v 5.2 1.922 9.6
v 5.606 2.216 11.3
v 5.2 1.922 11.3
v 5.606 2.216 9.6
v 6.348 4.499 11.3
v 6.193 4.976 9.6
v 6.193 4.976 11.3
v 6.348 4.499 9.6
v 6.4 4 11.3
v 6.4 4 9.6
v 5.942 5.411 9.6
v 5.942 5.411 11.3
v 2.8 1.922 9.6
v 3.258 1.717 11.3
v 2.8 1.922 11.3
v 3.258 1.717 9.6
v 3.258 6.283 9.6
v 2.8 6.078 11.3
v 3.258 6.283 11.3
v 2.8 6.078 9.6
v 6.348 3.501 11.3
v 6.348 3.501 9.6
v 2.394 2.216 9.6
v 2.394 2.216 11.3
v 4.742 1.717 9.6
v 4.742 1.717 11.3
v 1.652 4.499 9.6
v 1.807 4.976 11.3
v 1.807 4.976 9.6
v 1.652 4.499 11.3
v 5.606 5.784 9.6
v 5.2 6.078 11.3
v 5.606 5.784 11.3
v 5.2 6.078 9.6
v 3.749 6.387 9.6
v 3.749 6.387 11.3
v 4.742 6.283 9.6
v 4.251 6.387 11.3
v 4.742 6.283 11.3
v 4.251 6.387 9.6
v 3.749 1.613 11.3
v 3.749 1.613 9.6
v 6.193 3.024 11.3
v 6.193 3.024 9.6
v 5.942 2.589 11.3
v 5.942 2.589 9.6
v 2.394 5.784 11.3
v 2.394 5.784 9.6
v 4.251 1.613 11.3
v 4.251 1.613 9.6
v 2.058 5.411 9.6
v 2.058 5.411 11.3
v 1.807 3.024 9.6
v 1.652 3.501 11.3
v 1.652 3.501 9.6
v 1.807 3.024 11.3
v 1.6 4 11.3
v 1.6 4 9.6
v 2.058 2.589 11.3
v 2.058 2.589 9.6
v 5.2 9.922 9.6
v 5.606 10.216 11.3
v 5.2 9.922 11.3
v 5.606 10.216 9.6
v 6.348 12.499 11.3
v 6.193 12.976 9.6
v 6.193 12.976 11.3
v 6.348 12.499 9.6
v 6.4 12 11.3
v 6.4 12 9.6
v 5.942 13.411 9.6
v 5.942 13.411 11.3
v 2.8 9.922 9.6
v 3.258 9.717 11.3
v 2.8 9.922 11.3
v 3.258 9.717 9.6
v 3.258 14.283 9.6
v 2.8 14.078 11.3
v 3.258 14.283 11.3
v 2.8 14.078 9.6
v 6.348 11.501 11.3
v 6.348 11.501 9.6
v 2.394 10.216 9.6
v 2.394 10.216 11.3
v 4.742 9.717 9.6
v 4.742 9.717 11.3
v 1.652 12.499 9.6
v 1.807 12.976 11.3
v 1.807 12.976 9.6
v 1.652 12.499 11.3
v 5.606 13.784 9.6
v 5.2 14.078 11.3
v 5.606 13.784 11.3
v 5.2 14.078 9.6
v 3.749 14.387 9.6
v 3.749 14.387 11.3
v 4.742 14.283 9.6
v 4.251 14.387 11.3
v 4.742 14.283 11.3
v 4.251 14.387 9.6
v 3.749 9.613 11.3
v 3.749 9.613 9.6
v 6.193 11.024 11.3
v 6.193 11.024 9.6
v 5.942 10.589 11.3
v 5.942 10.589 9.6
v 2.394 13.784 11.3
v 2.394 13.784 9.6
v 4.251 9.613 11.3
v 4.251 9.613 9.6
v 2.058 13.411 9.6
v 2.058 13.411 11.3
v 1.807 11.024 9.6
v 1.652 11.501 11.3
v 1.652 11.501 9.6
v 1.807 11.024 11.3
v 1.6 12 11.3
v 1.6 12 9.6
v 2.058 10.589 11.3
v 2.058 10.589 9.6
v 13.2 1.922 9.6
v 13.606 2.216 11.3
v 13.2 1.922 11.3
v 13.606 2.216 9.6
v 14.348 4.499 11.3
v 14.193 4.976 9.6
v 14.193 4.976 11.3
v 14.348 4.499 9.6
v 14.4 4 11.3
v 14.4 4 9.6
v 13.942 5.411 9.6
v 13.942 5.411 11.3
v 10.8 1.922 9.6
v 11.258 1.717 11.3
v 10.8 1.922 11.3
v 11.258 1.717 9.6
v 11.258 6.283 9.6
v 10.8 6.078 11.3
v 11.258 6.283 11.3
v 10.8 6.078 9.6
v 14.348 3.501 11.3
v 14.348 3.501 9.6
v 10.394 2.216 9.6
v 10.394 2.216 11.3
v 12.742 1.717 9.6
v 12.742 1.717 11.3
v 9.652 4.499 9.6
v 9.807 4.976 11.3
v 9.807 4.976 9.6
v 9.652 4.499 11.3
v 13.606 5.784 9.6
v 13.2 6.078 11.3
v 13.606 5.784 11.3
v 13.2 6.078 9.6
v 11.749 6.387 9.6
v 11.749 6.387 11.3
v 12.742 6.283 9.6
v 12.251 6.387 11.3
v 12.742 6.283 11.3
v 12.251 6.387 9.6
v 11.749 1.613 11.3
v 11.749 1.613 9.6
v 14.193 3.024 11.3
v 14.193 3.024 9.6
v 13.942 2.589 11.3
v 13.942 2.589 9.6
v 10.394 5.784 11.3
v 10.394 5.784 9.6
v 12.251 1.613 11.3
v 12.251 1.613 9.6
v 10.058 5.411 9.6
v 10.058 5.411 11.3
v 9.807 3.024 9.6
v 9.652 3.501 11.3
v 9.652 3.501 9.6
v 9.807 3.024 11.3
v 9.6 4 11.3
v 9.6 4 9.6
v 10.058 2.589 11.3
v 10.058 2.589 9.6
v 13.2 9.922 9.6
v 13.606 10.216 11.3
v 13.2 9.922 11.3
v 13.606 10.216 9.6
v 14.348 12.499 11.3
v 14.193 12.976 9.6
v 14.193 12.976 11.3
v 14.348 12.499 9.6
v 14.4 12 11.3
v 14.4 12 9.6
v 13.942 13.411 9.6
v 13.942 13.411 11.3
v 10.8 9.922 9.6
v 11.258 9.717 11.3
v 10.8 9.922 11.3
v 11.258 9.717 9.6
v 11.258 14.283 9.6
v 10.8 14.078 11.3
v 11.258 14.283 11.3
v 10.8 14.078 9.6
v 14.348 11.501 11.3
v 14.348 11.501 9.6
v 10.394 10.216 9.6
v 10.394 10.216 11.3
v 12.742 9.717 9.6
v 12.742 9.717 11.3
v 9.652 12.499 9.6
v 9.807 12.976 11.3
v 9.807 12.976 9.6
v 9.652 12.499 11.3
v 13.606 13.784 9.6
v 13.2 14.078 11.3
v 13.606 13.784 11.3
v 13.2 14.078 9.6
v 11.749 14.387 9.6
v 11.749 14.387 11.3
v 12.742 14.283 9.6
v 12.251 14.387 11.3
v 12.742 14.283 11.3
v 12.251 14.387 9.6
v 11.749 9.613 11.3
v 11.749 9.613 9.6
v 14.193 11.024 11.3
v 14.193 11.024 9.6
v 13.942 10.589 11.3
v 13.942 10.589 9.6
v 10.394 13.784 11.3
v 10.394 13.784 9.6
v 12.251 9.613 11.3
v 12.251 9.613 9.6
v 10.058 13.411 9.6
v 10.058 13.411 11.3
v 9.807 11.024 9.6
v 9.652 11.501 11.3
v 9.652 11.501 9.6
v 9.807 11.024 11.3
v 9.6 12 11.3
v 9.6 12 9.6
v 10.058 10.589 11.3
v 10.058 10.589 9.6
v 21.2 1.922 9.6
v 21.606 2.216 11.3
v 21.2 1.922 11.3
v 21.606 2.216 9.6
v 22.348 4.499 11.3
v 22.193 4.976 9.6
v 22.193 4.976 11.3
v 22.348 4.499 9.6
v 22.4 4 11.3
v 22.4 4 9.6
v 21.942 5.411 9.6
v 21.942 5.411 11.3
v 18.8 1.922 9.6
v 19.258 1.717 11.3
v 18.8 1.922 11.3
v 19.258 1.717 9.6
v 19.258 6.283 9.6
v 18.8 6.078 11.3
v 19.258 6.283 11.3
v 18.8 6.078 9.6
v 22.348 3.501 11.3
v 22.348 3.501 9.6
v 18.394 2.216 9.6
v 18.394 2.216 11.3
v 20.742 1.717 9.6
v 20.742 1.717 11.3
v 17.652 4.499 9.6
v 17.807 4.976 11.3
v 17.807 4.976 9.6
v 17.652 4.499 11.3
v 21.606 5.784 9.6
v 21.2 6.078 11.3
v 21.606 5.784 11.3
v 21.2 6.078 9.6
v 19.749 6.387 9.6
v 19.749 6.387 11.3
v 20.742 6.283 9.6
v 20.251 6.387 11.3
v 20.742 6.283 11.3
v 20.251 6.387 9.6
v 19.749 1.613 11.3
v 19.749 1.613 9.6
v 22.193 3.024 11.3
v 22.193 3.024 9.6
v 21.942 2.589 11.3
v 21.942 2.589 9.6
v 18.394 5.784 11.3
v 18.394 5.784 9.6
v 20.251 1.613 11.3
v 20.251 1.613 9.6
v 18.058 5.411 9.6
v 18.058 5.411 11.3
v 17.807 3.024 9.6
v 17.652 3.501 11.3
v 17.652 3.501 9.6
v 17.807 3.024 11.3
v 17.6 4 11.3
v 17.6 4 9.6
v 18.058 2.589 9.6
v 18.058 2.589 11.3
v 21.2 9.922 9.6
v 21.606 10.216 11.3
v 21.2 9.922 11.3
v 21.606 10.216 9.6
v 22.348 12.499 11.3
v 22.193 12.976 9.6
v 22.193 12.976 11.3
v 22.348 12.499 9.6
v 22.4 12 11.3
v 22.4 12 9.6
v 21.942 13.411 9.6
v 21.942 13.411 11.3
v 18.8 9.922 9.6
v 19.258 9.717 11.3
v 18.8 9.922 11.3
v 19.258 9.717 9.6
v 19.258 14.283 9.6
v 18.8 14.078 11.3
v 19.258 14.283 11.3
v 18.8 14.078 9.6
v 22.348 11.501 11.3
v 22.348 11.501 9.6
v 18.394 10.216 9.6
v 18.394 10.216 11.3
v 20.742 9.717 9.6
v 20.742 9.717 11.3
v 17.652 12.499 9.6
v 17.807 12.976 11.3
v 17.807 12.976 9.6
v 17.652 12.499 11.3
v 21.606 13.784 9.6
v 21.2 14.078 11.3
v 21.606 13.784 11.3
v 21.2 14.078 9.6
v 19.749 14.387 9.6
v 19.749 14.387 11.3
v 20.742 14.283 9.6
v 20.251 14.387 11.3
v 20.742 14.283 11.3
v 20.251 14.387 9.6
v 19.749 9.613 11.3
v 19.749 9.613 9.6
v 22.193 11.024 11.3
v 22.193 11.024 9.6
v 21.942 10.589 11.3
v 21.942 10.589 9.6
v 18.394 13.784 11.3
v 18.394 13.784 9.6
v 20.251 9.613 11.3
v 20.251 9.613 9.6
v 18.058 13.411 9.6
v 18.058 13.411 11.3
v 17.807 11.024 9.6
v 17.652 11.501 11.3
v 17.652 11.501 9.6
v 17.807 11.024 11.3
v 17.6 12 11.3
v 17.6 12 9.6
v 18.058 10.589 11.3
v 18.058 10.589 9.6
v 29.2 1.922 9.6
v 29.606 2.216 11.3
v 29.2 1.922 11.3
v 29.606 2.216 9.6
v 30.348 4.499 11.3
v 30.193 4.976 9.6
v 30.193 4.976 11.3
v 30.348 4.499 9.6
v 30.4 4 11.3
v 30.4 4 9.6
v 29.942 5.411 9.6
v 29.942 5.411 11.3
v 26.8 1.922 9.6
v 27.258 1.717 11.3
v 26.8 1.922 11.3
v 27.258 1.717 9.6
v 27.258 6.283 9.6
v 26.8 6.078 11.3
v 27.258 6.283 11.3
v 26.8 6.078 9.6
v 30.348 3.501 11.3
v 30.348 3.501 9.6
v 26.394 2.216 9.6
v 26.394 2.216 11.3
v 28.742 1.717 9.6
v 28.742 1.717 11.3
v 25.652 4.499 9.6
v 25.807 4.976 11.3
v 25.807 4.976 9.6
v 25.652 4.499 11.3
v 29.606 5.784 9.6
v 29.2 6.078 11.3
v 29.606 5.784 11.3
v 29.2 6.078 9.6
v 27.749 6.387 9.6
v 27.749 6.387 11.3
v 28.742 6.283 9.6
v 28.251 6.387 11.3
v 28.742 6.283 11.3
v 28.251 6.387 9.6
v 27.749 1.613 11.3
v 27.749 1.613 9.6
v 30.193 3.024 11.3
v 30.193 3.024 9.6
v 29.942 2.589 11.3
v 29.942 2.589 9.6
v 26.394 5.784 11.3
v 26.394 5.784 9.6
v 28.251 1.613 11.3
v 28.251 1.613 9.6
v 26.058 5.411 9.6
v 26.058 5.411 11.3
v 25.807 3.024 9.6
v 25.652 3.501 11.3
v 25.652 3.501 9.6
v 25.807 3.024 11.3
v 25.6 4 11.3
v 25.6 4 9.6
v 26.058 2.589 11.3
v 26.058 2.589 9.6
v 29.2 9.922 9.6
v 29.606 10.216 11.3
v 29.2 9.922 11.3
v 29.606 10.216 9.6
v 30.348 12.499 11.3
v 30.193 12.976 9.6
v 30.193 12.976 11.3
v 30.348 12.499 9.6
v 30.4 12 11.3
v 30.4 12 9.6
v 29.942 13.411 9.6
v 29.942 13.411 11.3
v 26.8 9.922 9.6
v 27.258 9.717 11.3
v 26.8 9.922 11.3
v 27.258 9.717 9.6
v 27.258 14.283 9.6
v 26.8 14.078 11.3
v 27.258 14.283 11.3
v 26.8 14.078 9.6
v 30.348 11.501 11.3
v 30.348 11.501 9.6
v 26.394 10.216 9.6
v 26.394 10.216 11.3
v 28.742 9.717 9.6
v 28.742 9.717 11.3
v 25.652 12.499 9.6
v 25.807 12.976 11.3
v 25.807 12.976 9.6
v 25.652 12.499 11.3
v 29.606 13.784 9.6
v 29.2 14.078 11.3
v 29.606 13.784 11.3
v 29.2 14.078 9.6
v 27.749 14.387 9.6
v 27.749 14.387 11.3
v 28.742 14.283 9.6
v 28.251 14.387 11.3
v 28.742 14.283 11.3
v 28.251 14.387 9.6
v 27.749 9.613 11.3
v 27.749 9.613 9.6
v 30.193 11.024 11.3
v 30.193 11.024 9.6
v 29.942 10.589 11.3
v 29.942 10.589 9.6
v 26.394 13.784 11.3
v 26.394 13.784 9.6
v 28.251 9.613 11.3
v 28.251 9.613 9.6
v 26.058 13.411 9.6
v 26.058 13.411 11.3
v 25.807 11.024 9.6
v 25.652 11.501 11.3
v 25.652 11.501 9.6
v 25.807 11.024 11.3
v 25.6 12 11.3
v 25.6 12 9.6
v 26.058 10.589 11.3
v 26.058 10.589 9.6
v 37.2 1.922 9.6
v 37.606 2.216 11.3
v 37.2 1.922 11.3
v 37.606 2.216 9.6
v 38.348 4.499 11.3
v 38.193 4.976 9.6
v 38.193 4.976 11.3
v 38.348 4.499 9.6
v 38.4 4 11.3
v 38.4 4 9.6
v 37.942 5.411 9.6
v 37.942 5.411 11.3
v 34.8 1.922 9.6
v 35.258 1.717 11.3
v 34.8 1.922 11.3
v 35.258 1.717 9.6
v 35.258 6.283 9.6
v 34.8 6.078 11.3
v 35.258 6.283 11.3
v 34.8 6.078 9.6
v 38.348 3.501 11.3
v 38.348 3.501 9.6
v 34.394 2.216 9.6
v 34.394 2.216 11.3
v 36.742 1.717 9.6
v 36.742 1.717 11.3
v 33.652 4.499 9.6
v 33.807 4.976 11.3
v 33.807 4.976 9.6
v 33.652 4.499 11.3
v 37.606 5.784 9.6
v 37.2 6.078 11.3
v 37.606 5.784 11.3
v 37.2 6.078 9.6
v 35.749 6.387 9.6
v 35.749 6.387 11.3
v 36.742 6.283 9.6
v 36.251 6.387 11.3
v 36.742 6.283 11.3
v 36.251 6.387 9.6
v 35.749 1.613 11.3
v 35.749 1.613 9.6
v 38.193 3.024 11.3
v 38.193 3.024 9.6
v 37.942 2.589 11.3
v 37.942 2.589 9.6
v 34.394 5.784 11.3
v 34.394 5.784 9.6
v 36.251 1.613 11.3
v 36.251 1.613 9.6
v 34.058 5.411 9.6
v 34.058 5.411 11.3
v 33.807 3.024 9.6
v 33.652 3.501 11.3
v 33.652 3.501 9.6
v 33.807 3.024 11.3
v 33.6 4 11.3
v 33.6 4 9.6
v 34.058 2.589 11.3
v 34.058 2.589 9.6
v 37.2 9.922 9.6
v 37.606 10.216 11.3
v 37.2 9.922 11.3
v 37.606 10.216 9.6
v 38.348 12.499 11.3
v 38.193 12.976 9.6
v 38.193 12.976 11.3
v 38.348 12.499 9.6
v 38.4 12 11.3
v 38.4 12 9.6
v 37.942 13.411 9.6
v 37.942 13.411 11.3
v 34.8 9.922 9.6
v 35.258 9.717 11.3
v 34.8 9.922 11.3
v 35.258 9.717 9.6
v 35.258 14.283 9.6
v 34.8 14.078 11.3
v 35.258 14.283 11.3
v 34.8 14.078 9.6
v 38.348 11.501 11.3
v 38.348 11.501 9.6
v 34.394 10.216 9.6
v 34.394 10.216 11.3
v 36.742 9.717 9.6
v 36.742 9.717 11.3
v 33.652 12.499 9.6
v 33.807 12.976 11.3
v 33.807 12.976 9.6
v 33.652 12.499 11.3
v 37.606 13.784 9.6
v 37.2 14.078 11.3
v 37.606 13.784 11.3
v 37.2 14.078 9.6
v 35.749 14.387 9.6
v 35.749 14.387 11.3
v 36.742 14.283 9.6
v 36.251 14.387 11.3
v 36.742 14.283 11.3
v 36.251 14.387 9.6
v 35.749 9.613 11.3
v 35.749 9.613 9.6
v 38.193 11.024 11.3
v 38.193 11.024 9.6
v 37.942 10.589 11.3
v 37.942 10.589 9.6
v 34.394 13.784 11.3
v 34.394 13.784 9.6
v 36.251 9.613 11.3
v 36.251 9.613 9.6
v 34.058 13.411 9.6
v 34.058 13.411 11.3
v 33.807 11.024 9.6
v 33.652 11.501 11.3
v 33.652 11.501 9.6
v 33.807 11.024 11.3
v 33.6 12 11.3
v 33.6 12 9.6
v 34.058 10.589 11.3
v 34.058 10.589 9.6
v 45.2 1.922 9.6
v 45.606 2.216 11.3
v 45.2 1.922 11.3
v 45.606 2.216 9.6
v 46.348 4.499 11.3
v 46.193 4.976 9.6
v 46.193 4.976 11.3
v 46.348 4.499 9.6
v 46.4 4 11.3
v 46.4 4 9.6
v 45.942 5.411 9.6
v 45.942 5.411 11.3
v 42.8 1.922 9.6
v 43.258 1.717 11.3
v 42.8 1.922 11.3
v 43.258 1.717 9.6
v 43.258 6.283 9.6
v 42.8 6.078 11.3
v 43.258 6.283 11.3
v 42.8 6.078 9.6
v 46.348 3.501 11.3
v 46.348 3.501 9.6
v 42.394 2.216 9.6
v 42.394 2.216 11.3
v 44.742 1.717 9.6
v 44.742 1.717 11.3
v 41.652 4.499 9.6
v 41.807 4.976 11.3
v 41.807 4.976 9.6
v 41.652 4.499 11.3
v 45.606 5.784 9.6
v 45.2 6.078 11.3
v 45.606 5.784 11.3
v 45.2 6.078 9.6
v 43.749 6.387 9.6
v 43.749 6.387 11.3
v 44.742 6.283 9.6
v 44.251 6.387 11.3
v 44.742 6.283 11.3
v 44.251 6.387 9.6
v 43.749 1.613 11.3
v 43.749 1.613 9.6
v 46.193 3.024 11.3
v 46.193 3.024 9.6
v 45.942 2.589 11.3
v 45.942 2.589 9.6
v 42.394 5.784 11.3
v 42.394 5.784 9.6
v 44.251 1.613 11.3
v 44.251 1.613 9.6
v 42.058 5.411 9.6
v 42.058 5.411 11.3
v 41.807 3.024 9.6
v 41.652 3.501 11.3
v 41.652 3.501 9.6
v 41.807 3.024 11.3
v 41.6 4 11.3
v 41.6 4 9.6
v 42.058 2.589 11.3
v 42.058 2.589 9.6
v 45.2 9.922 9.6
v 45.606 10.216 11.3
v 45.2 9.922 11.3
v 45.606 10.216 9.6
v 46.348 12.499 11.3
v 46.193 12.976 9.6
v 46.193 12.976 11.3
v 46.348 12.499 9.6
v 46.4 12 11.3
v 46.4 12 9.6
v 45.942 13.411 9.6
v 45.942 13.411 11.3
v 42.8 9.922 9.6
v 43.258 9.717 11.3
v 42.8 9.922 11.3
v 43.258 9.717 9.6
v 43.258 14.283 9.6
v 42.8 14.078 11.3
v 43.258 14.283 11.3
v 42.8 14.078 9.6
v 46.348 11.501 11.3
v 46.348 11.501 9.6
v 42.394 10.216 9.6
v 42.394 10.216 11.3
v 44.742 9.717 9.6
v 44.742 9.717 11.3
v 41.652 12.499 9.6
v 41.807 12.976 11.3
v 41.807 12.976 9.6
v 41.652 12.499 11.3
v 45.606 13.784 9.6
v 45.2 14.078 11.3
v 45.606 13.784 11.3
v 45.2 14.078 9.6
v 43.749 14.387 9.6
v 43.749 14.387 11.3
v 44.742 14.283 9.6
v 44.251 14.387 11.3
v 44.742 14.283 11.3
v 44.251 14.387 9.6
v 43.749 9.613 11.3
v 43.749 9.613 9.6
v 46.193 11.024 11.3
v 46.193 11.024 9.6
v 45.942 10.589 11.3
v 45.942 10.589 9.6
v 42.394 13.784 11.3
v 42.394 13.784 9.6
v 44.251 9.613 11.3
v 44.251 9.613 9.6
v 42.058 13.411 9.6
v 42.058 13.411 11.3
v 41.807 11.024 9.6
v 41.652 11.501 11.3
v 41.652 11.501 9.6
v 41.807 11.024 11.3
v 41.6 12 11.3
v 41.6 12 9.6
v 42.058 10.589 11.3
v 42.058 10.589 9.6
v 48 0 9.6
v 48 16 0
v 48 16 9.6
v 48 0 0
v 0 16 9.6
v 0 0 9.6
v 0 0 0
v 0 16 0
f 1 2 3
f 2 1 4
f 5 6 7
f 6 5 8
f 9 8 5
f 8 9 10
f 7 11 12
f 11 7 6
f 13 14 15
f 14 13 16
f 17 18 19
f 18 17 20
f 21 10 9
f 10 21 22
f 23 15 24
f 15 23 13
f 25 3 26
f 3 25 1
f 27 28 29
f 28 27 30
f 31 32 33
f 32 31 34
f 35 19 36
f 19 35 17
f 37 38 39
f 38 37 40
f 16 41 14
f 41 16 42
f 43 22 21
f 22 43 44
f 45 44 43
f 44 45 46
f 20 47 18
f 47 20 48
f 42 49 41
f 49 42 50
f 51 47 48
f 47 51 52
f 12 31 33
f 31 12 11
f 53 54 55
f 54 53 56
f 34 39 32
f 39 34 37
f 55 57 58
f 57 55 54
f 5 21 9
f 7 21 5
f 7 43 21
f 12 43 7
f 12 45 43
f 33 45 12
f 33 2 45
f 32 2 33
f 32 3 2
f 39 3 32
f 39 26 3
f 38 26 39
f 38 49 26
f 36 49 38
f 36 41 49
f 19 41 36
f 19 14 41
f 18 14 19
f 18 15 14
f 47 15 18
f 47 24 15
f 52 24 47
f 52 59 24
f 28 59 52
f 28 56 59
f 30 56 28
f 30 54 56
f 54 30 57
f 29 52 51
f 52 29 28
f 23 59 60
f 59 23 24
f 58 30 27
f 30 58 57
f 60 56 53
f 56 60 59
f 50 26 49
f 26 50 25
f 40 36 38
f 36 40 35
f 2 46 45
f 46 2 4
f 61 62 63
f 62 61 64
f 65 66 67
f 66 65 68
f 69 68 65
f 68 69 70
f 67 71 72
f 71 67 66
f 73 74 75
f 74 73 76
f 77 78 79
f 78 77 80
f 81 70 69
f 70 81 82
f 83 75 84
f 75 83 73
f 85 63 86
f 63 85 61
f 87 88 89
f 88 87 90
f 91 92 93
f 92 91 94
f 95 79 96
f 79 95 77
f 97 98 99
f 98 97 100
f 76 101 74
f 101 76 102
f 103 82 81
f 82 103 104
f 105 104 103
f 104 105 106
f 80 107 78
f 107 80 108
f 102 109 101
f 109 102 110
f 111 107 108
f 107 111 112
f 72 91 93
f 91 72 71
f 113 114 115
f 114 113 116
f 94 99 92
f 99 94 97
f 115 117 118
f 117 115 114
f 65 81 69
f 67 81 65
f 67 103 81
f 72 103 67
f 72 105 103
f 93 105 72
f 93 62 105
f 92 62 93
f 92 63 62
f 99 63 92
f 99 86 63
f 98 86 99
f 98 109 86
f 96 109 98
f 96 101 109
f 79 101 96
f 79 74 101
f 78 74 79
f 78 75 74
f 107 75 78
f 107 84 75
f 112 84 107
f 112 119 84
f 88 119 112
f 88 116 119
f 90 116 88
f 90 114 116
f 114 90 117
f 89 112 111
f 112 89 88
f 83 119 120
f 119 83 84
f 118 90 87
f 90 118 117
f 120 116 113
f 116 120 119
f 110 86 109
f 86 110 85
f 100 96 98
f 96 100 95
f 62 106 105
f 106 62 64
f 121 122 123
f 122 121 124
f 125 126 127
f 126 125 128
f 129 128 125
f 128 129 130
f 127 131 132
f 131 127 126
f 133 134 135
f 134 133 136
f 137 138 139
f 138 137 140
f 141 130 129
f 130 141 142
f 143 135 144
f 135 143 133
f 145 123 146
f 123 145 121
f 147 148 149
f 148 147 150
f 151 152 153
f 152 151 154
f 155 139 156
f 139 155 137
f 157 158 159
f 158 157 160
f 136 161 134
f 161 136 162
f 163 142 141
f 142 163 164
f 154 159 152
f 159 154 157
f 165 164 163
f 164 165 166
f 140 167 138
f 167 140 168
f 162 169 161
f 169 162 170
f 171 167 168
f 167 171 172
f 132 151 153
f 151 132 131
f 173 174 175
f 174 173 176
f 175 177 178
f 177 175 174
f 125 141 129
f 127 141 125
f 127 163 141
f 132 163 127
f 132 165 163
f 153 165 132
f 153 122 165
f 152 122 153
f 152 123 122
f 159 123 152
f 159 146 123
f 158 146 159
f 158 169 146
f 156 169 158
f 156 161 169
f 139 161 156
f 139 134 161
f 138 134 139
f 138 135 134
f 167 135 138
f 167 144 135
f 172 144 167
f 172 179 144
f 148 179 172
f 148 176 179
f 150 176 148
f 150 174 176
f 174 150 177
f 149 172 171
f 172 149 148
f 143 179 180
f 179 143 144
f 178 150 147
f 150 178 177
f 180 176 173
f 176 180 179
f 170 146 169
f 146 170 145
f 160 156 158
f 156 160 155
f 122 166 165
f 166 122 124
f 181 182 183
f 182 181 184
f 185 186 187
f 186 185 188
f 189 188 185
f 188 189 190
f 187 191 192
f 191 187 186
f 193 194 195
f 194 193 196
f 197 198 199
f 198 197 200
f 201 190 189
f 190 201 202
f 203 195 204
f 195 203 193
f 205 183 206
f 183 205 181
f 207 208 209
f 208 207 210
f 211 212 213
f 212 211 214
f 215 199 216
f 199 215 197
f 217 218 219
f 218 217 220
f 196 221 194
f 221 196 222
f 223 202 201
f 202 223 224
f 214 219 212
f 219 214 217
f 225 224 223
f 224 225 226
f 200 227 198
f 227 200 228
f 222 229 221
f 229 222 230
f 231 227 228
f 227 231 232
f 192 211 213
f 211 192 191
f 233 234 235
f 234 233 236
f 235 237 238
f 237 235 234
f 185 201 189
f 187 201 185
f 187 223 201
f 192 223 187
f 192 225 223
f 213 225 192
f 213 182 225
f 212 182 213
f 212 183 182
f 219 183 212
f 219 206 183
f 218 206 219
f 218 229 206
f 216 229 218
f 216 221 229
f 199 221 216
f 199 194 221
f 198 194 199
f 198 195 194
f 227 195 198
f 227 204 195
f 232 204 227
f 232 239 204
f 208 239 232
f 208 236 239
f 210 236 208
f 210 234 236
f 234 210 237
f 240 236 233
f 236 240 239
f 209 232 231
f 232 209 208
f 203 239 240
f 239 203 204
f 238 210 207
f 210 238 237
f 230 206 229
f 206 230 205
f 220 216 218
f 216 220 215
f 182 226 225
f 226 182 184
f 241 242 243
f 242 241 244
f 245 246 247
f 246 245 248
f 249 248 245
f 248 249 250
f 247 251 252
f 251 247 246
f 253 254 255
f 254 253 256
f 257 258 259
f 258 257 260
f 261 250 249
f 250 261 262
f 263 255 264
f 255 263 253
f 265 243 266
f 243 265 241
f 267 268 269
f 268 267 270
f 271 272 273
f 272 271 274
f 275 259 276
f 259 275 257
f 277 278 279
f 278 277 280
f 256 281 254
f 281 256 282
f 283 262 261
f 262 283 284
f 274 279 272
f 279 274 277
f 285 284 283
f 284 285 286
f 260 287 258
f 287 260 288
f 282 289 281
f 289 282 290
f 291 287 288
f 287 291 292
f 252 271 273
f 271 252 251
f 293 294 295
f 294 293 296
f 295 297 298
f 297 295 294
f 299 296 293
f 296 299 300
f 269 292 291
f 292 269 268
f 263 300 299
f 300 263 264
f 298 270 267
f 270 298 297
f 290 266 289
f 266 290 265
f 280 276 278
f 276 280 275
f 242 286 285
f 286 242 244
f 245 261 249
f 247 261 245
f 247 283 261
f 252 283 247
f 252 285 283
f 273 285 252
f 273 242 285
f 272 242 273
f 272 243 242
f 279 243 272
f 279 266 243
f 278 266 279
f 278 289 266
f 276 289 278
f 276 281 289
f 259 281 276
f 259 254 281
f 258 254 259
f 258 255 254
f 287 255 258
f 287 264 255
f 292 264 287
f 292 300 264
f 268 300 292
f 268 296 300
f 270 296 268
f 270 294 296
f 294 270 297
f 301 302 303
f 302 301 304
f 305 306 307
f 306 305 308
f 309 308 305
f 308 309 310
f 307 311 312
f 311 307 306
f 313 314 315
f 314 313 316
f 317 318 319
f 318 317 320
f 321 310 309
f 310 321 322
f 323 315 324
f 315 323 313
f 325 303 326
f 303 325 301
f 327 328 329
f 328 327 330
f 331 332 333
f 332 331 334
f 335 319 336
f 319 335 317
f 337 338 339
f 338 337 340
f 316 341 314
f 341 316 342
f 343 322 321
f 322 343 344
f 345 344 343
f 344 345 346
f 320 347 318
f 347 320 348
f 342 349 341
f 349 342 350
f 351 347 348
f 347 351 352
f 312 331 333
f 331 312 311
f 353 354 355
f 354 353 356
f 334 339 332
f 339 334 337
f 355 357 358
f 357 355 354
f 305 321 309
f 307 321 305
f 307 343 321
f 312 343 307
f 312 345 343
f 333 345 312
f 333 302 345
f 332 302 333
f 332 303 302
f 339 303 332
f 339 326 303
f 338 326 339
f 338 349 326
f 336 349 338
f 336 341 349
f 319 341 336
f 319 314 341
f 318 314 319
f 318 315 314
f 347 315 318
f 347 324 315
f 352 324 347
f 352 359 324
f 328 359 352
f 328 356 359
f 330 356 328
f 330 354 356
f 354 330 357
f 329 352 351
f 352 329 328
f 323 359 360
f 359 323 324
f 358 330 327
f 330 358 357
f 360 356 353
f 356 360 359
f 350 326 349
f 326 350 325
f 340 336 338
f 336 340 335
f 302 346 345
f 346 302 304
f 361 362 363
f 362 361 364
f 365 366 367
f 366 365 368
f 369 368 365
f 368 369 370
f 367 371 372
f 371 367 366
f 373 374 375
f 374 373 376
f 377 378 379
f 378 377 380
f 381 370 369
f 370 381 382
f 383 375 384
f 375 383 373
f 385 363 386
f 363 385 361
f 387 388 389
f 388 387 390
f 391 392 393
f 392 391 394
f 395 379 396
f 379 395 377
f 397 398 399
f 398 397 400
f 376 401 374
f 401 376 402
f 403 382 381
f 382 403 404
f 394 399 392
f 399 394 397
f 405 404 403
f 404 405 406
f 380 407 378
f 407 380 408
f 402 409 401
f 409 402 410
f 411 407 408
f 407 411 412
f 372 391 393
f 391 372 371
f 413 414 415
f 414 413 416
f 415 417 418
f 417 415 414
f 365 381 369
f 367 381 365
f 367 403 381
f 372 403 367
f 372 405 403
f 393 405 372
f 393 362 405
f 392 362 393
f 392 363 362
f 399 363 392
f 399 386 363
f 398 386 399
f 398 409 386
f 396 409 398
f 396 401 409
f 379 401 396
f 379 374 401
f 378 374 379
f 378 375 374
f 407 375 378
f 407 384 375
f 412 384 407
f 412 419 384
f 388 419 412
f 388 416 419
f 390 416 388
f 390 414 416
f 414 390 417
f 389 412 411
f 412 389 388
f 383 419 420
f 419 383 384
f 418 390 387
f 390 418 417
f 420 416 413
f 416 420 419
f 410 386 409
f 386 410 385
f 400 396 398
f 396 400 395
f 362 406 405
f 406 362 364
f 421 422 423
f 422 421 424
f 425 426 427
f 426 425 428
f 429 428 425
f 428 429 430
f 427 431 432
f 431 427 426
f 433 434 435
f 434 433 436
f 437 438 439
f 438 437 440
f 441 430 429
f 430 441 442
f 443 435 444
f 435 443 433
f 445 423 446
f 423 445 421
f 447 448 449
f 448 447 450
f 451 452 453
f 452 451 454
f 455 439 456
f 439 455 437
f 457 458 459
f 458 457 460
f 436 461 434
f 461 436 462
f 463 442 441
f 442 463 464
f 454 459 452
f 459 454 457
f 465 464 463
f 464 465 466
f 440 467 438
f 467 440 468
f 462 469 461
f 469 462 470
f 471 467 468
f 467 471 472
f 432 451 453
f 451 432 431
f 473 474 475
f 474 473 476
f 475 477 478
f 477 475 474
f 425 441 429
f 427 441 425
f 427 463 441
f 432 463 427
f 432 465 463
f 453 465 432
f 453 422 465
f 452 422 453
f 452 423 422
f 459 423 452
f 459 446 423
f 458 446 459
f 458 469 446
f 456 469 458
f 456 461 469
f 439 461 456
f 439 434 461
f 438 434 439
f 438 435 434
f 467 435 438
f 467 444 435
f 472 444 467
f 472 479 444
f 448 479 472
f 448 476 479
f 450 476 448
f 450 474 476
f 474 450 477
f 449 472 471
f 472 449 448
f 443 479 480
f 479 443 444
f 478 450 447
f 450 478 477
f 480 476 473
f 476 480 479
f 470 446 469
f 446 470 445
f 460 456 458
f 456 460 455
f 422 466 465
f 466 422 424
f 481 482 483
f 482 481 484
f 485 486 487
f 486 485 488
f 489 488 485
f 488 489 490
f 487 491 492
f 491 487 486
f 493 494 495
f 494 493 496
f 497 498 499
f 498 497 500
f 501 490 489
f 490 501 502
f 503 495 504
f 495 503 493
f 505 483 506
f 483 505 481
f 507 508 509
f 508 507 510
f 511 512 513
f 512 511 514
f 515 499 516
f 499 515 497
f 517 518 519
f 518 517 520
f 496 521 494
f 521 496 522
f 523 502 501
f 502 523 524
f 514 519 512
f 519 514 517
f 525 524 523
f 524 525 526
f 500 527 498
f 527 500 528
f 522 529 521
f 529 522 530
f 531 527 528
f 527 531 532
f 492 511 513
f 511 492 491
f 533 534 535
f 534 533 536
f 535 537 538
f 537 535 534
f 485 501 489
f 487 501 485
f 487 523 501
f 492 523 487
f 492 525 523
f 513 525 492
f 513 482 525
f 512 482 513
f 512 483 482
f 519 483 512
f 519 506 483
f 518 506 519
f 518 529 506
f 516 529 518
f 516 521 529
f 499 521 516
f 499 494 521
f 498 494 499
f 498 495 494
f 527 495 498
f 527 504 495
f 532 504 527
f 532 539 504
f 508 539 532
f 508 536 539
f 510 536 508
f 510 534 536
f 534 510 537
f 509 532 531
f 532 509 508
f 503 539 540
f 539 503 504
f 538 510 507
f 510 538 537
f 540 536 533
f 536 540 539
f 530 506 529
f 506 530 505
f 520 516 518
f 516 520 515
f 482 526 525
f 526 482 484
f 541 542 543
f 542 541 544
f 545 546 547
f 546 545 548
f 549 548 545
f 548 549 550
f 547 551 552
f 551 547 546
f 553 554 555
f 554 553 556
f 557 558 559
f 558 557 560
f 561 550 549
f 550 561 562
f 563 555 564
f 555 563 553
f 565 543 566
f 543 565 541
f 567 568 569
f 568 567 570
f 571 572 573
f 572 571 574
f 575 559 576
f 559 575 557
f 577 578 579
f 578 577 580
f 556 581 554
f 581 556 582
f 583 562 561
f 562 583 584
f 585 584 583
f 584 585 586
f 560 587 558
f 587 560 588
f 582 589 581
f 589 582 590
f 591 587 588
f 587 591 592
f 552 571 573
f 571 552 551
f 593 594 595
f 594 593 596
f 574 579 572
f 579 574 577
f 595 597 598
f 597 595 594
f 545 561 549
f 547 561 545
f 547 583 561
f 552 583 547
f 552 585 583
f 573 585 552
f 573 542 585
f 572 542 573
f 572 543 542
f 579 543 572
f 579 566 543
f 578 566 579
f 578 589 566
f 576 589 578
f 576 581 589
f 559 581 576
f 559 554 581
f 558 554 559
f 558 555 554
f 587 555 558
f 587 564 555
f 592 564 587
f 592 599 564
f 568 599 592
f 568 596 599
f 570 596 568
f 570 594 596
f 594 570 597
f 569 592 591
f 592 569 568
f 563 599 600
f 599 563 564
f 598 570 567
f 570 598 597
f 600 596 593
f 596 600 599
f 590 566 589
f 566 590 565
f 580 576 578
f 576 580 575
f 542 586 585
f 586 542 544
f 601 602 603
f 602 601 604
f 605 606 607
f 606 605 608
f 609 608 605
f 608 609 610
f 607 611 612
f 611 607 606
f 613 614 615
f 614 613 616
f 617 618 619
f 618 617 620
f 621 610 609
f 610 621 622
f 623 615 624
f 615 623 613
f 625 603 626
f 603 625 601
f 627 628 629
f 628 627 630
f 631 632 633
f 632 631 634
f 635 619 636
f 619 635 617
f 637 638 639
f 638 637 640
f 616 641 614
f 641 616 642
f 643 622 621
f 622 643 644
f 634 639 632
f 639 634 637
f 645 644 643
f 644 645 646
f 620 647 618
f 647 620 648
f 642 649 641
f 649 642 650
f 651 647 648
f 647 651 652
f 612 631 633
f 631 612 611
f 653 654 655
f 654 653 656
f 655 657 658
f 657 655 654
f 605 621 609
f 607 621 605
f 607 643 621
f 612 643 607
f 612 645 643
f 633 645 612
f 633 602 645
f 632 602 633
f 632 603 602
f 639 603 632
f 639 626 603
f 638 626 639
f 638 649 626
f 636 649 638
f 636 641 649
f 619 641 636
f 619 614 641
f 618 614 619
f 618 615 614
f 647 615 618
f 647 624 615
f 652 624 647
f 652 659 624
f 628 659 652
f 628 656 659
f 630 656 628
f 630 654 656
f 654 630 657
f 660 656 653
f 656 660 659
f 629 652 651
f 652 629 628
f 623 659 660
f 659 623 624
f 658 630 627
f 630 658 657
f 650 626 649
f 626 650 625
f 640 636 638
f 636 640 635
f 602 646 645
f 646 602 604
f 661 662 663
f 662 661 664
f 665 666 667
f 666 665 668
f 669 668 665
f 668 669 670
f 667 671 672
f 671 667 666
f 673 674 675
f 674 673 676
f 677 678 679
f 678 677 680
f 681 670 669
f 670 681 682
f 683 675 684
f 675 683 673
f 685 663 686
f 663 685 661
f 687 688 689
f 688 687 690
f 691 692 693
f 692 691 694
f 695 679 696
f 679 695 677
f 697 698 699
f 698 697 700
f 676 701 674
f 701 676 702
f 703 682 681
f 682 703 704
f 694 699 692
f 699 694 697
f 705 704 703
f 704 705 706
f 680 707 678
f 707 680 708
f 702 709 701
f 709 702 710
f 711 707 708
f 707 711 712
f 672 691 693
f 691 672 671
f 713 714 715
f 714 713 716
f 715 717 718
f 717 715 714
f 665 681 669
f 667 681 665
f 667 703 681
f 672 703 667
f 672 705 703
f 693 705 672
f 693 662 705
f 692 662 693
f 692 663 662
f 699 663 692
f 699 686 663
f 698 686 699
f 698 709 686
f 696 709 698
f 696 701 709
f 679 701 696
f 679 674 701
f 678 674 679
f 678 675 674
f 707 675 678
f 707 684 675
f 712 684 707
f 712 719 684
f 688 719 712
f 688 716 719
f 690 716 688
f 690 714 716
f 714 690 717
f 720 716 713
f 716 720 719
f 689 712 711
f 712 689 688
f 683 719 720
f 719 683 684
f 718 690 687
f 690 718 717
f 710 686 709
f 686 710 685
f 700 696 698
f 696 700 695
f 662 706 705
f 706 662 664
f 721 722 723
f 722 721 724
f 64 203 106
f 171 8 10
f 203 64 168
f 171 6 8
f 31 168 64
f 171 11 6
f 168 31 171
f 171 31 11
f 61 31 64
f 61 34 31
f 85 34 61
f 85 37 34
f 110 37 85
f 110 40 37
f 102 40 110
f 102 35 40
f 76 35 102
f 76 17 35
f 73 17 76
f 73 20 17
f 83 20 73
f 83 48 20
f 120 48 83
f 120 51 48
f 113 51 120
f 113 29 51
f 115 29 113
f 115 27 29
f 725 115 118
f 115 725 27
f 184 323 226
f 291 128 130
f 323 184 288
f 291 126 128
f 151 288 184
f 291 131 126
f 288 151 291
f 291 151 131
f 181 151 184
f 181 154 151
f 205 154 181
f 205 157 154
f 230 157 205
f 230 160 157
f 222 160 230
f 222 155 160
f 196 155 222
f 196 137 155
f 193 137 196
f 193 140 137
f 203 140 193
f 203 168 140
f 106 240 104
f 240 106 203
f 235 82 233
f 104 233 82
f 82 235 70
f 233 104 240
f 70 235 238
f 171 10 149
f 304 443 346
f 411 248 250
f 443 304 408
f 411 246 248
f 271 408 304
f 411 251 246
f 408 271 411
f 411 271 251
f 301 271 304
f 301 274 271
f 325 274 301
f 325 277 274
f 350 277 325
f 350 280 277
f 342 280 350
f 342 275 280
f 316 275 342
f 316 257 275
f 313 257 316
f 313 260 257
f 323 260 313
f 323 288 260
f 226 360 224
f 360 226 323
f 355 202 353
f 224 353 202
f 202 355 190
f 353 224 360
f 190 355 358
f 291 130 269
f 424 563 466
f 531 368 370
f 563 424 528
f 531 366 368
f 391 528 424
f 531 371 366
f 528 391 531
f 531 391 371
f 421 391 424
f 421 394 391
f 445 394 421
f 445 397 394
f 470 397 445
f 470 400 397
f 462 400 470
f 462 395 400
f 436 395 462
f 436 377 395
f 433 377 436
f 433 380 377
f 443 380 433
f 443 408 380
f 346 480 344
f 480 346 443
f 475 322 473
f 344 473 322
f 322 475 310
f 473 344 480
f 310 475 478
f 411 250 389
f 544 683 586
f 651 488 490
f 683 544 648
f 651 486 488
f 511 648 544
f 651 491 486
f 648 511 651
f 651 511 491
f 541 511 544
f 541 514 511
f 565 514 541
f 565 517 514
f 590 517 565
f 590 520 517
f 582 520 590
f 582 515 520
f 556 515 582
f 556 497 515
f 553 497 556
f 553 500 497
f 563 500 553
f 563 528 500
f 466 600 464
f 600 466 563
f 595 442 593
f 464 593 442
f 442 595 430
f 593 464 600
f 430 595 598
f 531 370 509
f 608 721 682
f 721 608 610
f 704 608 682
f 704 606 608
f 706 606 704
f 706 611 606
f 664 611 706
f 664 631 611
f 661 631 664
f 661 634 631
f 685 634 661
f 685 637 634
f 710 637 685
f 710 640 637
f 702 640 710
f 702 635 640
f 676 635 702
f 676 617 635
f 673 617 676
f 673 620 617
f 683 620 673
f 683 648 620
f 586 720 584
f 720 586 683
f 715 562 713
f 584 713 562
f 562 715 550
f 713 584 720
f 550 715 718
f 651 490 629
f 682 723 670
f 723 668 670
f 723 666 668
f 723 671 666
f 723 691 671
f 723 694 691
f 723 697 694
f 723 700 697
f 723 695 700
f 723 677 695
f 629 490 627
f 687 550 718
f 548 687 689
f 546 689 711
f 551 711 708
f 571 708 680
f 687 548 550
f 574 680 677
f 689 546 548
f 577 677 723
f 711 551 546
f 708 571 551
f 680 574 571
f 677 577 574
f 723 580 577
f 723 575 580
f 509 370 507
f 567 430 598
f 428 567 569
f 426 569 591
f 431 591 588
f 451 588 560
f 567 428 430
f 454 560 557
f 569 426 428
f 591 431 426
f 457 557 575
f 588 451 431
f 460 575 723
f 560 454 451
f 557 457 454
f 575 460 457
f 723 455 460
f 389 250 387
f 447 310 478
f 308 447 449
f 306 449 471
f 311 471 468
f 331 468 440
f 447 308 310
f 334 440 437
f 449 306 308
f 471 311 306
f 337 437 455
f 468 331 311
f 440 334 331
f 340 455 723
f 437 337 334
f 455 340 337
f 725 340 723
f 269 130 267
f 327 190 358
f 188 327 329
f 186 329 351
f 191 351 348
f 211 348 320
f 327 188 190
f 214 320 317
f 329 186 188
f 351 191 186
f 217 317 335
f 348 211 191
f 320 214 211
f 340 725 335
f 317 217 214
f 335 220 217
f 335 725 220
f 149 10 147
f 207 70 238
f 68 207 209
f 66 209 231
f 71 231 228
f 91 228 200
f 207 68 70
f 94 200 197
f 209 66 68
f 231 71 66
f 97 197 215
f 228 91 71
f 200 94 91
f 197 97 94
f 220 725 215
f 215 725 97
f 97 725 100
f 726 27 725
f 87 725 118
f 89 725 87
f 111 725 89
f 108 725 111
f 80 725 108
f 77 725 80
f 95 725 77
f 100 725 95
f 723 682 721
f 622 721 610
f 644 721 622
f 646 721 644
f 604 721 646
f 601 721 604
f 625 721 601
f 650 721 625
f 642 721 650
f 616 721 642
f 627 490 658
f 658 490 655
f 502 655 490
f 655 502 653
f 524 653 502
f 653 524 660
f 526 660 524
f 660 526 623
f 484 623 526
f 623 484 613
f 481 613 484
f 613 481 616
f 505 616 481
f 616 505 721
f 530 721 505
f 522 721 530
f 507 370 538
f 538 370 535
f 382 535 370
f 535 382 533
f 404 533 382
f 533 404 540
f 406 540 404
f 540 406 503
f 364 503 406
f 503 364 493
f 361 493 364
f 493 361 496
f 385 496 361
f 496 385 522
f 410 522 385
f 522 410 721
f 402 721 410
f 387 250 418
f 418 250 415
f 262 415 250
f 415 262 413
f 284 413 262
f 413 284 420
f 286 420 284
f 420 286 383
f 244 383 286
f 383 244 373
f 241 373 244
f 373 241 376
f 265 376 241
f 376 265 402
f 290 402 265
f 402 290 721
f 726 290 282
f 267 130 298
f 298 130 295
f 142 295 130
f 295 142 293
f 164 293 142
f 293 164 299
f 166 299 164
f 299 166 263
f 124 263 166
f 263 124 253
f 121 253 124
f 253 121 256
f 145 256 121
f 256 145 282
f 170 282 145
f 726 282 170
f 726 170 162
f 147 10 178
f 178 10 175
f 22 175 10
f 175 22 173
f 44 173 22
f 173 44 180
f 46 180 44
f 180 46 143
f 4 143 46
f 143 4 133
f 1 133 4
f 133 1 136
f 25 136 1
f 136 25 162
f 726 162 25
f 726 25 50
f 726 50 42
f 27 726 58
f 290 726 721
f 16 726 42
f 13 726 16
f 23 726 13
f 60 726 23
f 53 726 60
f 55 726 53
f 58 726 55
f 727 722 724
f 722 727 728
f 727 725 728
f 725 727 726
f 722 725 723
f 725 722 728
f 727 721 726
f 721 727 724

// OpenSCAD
module LEGObrick(studs_per_row=4) {
  $fn=30;

  width = studs_per_row * 8;
  
  cube([width, 16, 9.6]);

  for (x_position=[4:8:width-4]) {
    translate([x_position, 4, 1.7]) {
      cylinder(h=9.6, d=4.8);
    }
    translate([x_position, 12, 1.7]) {
      cylinder(h=9.6, d=4.8);
    }
  }  
}

LEGObrick(6);
